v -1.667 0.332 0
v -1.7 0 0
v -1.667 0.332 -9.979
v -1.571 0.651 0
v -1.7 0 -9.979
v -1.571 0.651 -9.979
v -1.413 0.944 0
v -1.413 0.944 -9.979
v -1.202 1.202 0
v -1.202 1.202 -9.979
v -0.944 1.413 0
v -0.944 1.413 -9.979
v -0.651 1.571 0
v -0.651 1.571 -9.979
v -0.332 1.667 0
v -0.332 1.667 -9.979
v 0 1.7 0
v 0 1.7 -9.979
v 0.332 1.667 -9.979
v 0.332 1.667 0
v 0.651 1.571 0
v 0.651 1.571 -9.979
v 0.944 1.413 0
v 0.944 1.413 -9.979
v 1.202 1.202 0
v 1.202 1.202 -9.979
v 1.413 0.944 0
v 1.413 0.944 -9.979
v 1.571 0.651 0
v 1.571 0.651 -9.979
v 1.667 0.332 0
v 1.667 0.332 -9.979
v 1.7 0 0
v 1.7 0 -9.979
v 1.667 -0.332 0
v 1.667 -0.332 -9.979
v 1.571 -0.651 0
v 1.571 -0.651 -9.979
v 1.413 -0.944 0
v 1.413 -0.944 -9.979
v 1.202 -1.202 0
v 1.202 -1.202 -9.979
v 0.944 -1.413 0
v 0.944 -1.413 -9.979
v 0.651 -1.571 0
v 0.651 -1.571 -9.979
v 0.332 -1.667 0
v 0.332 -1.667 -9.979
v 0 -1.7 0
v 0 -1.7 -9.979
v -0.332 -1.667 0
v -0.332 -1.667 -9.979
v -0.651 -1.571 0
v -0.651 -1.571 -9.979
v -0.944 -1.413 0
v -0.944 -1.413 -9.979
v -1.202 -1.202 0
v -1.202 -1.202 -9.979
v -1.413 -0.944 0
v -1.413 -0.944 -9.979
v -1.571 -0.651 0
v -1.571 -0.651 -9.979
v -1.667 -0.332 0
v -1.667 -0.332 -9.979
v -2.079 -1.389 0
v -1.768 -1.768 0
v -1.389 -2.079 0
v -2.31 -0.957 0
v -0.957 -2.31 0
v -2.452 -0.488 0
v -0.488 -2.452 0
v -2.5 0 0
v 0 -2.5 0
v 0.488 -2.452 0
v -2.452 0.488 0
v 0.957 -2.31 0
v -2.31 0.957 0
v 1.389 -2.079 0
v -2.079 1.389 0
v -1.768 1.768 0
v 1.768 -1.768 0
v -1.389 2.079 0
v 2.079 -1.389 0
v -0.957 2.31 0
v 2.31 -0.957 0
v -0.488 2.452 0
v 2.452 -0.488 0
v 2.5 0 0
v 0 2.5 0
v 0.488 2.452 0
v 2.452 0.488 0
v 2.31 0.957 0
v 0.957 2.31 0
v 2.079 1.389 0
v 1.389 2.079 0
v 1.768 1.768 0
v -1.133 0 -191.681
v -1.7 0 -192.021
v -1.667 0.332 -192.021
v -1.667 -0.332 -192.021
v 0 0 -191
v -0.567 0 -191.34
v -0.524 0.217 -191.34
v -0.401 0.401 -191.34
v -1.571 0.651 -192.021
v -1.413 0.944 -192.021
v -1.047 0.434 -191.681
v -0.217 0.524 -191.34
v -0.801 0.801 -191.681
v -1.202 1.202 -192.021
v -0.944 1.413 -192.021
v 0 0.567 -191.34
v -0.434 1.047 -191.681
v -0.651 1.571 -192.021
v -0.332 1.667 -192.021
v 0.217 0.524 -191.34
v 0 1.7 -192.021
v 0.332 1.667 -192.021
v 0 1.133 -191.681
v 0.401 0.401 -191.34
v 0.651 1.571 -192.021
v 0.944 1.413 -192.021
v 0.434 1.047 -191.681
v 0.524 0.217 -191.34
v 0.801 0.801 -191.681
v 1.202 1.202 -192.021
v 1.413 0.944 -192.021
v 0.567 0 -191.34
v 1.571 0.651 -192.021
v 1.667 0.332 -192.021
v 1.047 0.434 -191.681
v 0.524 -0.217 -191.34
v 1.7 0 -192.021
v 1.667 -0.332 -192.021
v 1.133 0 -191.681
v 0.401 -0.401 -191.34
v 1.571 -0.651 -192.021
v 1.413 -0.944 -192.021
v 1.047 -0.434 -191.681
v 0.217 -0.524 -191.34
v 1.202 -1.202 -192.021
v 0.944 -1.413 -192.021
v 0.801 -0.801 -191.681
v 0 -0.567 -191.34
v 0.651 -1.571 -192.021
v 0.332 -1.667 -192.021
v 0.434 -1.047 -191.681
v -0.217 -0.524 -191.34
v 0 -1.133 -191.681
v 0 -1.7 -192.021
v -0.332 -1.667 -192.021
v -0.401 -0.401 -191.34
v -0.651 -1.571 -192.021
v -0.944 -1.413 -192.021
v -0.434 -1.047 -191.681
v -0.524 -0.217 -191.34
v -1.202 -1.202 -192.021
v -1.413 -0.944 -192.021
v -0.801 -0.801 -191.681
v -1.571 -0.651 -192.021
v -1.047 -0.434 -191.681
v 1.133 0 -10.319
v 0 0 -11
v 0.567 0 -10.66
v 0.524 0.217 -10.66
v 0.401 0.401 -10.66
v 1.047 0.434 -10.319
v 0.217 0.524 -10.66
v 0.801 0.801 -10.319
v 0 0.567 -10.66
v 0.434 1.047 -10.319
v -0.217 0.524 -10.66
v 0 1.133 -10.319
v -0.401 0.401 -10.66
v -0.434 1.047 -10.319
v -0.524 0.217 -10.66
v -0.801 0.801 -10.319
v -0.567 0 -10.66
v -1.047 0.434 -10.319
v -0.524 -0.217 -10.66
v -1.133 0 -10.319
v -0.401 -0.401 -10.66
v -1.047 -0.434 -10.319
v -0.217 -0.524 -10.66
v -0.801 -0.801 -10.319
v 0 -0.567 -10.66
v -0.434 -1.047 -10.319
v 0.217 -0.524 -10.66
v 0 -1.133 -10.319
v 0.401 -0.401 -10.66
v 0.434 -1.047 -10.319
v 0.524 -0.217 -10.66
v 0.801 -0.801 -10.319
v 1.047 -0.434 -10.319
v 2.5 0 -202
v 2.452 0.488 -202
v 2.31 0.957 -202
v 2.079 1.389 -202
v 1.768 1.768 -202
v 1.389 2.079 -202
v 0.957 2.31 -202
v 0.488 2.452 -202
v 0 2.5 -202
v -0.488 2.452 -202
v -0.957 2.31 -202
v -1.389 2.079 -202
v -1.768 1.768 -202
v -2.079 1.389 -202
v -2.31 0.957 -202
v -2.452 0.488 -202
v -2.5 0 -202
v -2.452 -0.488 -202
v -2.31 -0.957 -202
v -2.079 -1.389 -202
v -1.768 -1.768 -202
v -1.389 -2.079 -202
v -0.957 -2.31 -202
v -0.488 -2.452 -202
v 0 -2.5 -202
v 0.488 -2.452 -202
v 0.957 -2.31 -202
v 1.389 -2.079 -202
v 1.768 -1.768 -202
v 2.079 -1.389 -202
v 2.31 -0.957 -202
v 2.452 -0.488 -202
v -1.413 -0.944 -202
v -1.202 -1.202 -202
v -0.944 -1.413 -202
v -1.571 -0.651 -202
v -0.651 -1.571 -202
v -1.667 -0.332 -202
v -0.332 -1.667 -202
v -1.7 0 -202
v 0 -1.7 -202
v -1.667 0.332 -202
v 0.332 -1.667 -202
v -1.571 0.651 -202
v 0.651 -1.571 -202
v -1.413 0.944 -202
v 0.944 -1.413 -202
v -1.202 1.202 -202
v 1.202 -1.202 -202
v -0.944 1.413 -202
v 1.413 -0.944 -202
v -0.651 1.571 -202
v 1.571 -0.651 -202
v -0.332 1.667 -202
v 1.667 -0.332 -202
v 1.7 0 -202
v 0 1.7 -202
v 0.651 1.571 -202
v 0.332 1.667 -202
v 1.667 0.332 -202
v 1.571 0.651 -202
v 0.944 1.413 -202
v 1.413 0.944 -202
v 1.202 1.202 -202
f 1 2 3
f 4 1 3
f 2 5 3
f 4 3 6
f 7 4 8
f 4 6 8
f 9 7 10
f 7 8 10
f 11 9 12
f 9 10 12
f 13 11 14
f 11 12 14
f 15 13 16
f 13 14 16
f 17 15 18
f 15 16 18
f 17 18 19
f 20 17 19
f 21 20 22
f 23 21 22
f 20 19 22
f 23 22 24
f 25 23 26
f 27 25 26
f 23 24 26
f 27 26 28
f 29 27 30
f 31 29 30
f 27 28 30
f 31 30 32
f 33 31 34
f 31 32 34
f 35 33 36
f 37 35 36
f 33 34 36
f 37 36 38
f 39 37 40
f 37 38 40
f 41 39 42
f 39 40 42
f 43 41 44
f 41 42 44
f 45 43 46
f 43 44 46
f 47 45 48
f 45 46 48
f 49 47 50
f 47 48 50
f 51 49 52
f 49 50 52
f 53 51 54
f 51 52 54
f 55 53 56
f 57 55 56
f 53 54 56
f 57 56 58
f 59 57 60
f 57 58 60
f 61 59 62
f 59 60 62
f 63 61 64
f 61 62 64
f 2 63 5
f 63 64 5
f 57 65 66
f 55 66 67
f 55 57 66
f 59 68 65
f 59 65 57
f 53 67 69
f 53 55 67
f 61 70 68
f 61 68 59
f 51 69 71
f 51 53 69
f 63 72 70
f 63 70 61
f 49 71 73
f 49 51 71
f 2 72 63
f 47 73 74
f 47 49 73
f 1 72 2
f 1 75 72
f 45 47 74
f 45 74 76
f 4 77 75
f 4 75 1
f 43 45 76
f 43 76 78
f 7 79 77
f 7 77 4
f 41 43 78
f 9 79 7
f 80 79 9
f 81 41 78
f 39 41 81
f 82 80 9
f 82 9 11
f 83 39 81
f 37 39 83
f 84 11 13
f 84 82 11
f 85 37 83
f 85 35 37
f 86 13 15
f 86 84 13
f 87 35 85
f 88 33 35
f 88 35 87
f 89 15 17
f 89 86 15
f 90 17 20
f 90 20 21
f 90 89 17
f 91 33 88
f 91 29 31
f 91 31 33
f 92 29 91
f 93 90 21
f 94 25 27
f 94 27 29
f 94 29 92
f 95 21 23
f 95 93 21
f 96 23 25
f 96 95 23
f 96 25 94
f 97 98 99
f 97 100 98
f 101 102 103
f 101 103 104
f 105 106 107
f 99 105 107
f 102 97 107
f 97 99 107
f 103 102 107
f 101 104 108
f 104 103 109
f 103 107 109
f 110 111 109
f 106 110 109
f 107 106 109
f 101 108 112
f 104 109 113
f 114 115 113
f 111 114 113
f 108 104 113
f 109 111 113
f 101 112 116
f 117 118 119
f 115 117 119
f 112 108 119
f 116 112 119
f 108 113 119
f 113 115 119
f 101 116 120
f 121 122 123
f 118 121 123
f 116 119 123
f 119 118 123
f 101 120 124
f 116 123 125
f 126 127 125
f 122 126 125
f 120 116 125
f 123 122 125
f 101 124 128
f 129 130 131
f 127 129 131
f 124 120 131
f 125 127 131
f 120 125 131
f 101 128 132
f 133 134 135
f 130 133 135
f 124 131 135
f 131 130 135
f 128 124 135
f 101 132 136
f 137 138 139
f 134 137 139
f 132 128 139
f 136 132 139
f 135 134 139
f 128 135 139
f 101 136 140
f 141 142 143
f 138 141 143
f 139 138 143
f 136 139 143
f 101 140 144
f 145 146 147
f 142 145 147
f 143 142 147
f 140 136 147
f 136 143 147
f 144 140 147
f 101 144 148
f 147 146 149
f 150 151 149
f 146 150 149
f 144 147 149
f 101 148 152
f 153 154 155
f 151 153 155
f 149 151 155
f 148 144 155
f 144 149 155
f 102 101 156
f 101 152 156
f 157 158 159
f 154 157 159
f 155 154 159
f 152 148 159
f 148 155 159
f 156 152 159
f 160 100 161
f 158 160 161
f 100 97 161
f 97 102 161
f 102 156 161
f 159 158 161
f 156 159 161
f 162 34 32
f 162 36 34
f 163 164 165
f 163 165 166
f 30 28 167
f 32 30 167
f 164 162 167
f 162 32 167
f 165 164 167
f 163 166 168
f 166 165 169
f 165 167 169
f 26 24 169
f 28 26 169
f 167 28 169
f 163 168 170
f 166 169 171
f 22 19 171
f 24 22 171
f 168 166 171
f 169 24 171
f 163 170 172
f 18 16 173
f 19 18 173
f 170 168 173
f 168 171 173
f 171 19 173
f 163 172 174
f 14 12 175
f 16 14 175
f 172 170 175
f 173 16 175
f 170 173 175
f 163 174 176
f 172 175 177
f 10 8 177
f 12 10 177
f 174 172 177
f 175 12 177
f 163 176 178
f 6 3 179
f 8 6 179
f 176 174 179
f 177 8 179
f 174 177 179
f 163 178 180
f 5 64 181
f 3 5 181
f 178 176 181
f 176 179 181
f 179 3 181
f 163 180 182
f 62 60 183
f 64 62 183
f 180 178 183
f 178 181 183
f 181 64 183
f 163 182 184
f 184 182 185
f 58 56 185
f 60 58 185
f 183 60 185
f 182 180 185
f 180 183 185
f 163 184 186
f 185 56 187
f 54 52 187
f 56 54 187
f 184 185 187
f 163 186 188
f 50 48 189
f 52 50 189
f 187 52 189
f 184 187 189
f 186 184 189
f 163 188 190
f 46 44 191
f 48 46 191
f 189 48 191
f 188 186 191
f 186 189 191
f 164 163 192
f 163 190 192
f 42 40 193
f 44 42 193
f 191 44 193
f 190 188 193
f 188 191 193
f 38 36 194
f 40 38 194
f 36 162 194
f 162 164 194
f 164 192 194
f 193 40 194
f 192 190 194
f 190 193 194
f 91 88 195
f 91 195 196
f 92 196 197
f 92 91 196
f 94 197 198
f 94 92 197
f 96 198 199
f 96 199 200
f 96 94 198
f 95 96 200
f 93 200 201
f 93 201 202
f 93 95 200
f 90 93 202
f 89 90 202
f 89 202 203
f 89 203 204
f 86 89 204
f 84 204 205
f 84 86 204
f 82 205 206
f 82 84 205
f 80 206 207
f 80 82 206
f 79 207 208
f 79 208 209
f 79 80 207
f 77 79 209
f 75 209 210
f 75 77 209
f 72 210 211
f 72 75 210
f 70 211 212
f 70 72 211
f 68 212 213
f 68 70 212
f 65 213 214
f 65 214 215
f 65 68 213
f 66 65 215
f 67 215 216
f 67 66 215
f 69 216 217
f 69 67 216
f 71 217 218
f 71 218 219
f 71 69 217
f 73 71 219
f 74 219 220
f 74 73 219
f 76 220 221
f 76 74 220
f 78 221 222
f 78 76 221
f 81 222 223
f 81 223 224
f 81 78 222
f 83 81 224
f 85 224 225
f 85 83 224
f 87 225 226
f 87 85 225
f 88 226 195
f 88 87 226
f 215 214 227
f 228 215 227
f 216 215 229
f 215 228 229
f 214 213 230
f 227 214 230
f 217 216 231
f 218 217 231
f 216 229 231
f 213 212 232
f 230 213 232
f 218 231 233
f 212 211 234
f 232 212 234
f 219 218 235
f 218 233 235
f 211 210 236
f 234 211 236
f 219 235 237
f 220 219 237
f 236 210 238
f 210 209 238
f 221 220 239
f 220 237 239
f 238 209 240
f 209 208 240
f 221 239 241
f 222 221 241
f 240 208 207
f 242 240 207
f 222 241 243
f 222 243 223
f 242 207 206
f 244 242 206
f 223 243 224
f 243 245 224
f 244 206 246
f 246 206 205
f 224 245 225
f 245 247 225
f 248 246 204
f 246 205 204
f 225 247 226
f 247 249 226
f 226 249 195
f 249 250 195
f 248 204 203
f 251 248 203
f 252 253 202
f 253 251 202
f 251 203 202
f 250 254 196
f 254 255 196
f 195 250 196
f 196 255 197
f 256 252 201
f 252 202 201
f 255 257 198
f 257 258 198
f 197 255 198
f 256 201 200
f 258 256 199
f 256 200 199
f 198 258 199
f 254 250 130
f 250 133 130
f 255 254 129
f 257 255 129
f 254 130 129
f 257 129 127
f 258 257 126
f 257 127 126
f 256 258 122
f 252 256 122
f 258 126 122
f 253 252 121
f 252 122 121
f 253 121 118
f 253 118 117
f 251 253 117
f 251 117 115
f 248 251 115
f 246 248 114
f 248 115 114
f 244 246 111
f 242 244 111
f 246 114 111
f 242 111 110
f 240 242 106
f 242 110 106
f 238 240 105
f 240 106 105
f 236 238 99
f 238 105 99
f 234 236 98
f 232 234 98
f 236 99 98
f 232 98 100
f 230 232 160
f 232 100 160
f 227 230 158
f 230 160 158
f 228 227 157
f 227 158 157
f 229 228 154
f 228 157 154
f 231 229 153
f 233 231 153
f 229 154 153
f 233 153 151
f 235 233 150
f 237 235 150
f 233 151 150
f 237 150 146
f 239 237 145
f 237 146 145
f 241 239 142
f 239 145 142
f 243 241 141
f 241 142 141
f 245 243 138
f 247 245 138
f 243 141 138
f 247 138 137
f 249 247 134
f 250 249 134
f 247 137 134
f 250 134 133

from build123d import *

# Parameters (mm, degrees)
SCHIZZO1_R                   = 2.5
ESTRUSIONE_ESTRUSIONE1_DEPTH = 202
FORO_PER_VITE_M3_1_D         = 3.4
FORO_PER_VITE_M3_1_DEPTH     = 9.978536948
FORO_PER_VITE_M3_1_TIP       = 1.021463052
FORO_PER_VITE_M3_2_D         = 3.4
FORO_PER_VITE_M3_2_DEPTH     = 9.978536948
FORO_PER_VITE_M3_2_TIP       = 1.021463052


with BuildPart() as part:
    # Schizzo1 → Estrusione-Estrusione1 (new body)
    with BuildSketch(Plane.XY):
        Circle(SCHIZZO1_R)
    extrude(amount=-ESTRUSIONE_ESTRUSIONE1_DEPTH)

    # Foro per Vite M3-1
    with Locations(Plane.XY):
        with Locations((0, 0)):
            Hole(FORO_PER_VITE_M3_1_D / 2, depth=FORO_PER_VITE_M3_1_DEPTH)
            with Locations((0, 0, -(FORO_PER_VITE_M3_1_DEPTH + FORO_PER_VITE_M3_1_TIP / 2))):  # 118° drill point
                Cone(0, FORO_PER_VITE_M3_1_D / 2, FORO_PER_VITE_M3_1_TIP, mode=Mode.SUBTRACT)

    # Foro per Vite M3-2
    with Locations(Plane(origin=(0, 0, -202), x_dir=(-1, 0, 0), z_dir=(0, 0, -1))):
        with Locations((0, 0)):
            Hole(FORO_PER_VITE_M3_2_D / 2, depth=FORO_PER_VITE_M3_2_DEPTH)
            with Locations((0, 0, -(FORO_PER_VITE_M3_2_DEPTH + FORO_PER_VITE_M3_2_TIP / 2))):  # 118° drill point
                Cone(0, FORO_PER_VITE_M3_2_D / 2, FORO_PER_VITE_M3_2_TIP, mode=Mode.SUBTRACT)


solid = part.part
